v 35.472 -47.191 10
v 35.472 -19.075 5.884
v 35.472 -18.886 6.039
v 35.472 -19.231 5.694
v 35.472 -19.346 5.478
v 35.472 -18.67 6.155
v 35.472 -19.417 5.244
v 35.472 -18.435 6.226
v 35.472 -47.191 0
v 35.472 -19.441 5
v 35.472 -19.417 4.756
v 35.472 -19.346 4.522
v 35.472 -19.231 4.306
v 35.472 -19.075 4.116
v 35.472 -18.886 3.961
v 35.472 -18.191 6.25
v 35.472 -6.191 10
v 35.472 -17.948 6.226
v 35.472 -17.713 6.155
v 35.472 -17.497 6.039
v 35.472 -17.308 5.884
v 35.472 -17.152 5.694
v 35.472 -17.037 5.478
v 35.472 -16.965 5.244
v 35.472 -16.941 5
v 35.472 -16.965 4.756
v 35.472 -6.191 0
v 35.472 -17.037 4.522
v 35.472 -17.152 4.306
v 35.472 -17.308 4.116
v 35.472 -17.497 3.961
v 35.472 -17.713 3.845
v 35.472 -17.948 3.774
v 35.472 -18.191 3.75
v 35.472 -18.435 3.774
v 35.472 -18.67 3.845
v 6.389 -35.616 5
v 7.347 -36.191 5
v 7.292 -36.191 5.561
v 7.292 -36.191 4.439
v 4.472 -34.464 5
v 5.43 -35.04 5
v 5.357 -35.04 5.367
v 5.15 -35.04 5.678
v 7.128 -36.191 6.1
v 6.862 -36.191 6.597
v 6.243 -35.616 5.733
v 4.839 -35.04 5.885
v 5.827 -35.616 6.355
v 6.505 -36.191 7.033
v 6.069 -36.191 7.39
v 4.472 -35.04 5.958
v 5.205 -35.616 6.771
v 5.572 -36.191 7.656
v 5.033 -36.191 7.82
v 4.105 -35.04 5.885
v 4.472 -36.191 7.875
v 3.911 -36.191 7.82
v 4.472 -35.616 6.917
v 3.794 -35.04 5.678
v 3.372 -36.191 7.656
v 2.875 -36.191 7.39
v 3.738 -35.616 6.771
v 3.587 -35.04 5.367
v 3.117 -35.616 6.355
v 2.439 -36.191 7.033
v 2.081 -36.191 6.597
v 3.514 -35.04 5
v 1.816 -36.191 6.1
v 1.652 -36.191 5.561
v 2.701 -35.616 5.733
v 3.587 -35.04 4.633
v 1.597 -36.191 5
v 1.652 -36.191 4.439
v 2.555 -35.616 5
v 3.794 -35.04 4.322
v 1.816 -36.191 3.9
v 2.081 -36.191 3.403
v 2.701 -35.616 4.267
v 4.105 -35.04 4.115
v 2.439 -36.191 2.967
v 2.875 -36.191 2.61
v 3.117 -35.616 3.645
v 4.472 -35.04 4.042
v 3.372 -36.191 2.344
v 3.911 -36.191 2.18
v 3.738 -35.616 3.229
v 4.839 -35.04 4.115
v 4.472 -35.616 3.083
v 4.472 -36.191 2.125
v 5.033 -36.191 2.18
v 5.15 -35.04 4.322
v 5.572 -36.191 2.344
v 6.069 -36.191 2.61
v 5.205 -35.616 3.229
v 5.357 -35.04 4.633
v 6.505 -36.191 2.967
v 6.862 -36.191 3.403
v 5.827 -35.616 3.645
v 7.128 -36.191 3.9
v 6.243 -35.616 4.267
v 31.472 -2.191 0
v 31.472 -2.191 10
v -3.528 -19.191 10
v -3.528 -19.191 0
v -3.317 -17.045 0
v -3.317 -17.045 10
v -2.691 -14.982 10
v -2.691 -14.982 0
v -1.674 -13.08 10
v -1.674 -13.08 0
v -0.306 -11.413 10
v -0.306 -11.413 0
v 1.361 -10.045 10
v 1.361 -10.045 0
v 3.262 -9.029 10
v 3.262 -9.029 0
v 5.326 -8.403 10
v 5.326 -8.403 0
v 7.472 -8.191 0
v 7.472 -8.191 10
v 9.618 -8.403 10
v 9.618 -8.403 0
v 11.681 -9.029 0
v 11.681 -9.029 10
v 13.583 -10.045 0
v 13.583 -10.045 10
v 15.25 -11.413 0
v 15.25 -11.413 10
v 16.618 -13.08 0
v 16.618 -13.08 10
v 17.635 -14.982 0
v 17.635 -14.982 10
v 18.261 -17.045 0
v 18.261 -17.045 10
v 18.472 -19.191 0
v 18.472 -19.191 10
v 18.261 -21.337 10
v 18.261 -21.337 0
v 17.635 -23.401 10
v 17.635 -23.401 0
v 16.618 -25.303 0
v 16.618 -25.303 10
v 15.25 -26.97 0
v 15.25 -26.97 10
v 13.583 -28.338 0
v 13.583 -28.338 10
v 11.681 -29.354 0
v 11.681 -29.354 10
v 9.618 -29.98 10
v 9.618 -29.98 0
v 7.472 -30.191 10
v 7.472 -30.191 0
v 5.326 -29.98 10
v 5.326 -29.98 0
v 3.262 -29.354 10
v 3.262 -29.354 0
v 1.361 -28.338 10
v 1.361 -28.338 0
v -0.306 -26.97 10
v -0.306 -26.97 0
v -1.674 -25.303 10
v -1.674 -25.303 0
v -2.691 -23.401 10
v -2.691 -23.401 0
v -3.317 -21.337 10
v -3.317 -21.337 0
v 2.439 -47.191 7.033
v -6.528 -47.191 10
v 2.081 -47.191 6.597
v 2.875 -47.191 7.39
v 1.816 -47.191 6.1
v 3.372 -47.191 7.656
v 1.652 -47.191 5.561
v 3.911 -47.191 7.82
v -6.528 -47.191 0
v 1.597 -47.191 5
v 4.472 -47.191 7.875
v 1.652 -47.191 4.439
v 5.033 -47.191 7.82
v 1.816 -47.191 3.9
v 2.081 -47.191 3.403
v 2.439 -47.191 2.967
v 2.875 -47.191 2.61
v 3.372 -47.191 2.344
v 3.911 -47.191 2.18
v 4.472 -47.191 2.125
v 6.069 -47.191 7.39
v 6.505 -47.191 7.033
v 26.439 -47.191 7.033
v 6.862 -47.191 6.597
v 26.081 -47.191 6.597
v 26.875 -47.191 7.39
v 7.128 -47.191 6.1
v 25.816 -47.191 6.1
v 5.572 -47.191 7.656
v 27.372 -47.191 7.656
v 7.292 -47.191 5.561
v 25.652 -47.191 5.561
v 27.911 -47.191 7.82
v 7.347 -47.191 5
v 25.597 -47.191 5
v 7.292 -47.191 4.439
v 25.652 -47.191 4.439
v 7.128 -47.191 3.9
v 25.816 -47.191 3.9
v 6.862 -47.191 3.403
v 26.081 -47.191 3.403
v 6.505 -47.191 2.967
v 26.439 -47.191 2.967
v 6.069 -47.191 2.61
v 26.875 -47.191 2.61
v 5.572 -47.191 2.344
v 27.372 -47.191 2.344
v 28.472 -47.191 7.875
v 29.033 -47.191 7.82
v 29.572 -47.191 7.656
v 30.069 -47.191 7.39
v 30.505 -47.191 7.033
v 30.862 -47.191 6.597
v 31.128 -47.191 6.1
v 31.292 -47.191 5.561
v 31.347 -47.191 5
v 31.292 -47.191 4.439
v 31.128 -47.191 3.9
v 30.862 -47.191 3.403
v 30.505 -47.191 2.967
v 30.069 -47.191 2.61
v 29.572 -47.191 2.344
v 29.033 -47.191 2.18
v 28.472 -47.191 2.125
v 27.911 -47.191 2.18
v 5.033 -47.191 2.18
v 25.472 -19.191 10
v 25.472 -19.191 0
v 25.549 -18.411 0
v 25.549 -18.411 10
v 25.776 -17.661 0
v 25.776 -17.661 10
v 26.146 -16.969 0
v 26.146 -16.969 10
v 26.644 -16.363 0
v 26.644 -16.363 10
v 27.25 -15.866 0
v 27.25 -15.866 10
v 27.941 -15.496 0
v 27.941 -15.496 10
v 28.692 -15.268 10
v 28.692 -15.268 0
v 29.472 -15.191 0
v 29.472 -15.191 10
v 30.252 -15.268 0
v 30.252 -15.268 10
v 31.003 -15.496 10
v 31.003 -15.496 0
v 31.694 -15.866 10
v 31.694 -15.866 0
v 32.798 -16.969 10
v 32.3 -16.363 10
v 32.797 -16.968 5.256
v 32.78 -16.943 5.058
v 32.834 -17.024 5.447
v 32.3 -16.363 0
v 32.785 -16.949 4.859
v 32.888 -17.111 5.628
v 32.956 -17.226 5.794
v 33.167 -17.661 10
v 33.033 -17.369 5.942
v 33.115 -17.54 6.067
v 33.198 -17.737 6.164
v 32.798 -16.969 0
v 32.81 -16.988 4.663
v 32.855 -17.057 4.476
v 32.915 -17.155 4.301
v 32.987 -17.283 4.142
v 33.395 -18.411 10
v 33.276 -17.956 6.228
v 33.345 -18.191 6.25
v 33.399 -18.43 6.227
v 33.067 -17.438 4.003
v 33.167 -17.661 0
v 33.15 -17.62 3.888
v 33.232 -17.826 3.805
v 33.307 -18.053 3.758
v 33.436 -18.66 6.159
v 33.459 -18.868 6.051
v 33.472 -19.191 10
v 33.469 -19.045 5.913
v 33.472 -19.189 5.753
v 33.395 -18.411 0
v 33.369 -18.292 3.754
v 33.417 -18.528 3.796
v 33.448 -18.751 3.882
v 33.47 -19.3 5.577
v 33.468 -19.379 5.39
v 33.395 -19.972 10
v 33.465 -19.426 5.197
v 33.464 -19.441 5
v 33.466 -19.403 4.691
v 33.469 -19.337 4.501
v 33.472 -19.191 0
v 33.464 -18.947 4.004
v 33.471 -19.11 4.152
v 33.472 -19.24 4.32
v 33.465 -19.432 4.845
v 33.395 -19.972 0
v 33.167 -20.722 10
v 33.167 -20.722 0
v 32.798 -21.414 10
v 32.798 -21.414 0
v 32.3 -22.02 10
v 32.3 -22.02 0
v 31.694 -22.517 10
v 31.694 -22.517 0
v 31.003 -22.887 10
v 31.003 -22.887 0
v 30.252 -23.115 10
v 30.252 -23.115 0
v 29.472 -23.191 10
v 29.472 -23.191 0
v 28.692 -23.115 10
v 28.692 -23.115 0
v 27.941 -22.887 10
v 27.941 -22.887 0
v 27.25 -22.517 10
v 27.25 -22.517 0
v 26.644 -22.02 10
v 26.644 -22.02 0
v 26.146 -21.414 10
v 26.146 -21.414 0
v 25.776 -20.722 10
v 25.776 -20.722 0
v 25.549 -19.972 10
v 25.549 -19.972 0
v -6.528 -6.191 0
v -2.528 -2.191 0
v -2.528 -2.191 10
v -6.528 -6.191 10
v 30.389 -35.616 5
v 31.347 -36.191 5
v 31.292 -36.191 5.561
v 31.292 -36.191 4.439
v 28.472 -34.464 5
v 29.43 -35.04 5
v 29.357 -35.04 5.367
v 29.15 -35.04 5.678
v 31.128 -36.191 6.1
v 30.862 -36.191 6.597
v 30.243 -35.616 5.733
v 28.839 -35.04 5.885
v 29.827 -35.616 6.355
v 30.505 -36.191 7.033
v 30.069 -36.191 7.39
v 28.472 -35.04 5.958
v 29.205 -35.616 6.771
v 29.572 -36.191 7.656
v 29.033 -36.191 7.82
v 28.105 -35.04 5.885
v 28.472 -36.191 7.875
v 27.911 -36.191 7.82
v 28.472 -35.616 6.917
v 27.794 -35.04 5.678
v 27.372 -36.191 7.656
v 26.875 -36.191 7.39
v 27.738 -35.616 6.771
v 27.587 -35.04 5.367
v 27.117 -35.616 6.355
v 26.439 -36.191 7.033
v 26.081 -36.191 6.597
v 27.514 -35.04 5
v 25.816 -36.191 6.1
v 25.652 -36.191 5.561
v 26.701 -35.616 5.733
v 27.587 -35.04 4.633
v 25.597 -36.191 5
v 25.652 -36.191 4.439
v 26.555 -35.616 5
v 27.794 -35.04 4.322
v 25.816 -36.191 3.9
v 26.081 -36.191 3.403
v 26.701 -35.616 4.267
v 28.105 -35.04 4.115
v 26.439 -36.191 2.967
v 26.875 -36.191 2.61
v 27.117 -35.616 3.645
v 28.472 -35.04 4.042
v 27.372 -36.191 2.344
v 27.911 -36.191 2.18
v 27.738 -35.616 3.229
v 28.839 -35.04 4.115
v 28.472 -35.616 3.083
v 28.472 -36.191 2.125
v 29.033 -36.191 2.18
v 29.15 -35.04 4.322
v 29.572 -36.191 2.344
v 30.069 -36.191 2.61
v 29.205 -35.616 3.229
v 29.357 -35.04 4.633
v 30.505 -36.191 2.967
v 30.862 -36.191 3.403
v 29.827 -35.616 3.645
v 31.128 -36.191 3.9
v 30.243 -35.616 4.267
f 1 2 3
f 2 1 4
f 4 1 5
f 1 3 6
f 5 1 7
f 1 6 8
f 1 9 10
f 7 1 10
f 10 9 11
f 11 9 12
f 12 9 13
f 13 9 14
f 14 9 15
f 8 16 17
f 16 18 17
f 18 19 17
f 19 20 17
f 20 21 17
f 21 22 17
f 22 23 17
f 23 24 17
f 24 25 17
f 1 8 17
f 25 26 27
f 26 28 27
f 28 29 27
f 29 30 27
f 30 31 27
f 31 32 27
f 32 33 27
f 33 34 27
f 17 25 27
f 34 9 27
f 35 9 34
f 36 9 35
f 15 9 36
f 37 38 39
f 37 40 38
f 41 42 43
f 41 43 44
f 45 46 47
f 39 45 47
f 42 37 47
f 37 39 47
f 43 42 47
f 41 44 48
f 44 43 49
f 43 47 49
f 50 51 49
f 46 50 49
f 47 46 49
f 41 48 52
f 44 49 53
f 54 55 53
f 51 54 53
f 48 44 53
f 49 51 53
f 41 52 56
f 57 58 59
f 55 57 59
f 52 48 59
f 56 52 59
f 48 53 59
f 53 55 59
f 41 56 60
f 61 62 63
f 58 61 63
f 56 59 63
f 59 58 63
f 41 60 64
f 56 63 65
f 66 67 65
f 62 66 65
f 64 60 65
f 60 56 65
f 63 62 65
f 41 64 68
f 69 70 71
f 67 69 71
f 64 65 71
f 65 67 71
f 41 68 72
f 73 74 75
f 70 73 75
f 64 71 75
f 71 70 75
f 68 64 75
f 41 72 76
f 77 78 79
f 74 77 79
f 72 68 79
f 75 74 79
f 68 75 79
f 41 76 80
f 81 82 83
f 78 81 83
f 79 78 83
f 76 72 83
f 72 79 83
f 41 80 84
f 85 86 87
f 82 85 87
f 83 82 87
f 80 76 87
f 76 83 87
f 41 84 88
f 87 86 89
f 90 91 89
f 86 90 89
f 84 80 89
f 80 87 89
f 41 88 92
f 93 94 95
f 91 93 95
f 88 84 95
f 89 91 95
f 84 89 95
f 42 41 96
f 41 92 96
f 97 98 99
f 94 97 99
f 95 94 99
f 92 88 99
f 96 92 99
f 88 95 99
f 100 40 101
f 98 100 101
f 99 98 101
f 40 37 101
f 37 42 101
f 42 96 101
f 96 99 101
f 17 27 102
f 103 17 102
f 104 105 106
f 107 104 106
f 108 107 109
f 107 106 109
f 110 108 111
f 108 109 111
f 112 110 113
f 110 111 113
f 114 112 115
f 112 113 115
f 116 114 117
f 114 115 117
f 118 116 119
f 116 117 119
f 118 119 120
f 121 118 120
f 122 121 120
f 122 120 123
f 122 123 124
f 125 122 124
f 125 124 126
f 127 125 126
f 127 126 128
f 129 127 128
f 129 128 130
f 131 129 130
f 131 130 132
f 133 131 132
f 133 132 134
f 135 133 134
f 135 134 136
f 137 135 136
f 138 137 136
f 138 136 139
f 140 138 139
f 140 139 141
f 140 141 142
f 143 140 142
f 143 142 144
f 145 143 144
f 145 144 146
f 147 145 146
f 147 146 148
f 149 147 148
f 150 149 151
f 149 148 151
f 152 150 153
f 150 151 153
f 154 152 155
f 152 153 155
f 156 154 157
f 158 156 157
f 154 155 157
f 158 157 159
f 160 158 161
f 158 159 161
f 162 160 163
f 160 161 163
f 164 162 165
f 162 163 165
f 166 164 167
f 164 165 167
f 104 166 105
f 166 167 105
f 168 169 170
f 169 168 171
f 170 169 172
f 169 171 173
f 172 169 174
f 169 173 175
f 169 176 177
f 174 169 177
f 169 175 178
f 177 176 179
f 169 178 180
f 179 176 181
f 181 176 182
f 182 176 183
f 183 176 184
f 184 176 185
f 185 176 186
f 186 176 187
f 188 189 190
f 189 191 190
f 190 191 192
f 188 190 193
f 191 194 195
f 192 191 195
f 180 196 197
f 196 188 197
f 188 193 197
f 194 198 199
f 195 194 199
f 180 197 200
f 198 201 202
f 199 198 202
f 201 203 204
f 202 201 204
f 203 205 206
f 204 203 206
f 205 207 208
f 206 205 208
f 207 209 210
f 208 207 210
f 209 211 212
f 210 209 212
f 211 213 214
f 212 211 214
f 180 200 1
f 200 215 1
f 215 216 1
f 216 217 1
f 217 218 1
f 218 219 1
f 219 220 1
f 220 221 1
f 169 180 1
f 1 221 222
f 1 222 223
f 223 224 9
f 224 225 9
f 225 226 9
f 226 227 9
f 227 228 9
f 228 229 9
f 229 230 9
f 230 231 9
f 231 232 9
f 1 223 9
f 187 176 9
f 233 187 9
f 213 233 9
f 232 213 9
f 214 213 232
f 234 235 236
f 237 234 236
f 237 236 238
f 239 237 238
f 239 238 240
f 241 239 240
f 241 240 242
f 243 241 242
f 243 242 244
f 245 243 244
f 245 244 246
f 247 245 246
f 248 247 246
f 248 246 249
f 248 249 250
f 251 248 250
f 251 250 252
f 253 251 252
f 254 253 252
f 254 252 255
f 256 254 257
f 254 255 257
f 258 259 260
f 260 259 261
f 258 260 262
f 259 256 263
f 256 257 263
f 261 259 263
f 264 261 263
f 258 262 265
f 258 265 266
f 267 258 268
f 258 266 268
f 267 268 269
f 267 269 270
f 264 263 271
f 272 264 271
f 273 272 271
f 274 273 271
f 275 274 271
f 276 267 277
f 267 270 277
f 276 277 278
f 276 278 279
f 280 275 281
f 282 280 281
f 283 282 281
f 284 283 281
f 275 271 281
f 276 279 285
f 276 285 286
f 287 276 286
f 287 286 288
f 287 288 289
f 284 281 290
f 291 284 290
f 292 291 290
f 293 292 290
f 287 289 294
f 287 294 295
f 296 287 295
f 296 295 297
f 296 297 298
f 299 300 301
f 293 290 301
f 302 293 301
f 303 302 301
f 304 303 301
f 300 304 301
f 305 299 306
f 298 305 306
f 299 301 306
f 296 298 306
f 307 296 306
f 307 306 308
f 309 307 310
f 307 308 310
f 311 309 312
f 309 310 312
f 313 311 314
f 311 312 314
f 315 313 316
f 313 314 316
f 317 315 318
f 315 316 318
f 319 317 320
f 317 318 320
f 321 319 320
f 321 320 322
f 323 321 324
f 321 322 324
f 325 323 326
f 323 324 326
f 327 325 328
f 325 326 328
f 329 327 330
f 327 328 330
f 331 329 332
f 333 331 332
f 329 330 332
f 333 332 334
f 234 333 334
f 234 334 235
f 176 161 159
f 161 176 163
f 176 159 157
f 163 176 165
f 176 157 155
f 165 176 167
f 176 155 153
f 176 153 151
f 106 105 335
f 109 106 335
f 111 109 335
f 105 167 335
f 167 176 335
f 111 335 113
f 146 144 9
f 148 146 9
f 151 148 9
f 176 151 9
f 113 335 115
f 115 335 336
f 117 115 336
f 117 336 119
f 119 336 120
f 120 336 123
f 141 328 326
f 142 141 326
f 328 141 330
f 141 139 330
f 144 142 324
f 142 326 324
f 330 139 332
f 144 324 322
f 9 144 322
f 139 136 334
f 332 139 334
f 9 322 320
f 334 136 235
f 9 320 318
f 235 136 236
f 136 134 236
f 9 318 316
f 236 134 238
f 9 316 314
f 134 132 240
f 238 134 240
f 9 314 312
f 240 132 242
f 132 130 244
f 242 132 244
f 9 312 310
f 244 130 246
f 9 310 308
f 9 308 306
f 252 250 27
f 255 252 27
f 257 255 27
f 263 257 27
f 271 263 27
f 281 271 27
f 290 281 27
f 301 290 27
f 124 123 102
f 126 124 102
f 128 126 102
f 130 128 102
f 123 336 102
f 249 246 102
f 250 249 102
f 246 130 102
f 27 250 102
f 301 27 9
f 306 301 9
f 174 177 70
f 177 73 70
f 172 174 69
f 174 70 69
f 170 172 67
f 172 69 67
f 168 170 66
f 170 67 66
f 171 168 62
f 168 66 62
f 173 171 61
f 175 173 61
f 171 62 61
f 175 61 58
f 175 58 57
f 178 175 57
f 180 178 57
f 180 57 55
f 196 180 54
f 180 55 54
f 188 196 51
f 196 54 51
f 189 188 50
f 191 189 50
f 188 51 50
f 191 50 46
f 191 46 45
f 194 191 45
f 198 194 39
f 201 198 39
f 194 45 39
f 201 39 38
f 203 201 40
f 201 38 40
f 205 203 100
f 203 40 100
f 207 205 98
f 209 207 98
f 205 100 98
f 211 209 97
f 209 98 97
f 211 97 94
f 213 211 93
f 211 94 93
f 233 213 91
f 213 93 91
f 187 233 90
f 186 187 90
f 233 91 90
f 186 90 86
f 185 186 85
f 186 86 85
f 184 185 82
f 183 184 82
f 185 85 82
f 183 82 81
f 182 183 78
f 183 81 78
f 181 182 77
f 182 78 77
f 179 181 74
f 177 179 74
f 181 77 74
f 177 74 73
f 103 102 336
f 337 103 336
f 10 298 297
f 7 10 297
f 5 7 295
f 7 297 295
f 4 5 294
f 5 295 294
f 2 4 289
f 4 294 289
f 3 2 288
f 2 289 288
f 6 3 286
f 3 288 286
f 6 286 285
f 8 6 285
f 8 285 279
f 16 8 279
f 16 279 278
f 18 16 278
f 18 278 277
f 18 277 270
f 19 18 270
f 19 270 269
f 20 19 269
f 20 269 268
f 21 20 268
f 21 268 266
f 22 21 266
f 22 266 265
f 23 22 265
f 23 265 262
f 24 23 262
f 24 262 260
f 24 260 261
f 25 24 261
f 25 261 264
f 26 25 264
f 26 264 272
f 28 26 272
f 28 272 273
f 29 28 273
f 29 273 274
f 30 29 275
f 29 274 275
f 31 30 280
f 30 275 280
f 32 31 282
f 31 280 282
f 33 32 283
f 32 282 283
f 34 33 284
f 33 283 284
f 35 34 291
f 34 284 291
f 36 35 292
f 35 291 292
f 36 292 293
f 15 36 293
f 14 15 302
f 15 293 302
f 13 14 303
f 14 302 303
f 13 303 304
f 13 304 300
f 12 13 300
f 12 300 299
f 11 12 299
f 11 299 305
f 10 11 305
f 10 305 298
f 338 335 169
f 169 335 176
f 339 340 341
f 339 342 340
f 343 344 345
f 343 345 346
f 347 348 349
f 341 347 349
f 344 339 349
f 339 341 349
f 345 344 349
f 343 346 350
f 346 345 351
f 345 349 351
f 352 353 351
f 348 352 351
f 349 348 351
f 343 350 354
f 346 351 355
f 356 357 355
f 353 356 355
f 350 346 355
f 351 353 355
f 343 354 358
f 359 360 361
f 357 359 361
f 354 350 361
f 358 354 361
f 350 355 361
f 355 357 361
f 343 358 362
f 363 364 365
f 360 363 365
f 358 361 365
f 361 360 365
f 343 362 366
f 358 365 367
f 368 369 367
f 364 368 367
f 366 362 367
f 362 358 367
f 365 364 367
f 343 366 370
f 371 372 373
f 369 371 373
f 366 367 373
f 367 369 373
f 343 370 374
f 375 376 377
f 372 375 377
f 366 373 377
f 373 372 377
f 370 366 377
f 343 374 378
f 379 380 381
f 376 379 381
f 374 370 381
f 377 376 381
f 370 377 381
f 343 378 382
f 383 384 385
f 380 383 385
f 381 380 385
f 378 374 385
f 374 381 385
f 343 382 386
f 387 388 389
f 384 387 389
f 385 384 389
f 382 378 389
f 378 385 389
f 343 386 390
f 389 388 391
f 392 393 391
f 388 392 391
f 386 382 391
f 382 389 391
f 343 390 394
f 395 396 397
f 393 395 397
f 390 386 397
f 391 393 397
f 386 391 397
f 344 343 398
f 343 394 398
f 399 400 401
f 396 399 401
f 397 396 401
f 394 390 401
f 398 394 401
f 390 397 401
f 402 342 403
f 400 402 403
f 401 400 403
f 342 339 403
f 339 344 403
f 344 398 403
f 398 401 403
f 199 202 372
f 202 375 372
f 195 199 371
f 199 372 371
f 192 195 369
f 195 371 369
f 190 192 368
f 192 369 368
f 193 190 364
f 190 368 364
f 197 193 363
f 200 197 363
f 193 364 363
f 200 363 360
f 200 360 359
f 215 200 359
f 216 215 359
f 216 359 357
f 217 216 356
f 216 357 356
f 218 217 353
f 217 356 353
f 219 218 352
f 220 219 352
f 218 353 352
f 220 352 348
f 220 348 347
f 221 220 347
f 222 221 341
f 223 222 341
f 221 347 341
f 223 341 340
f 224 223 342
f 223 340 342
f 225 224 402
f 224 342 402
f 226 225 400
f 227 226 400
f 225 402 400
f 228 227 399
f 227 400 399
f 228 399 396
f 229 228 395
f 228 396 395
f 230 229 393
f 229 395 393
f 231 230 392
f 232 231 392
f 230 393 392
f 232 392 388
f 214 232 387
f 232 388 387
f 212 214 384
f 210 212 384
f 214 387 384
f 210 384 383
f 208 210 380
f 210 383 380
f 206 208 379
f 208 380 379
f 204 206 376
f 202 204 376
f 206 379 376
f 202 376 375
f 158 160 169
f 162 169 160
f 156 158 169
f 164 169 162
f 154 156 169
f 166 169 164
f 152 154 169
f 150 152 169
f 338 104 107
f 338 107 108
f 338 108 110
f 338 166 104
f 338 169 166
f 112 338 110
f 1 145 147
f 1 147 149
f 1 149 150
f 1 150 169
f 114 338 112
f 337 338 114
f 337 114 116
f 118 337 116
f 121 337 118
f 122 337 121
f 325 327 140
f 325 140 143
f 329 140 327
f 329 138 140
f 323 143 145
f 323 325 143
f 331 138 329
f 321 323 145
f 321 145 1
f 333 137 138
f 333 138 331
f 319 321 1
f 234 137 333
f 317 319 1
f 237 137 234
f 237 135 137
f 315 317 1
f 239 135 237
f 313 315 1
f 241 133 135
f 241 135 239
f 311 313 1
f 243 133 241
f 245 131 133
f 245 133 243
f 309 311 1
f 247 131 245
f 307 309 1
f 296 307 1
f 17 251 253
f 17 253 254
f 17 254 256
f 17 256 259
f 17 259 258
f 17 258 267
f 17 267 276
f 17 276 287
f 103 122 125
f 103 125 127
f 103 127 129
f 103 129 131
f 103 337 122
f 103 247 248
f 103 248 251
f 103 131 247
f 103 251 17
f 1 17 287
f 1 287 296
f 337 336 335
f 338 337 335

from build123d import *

# Parameters (mm, degrees)
F1_DEPTH = 10
F3_D     = 22
F4_D     = 8
F6_D     = 2.5
F6_DEPTH = 5
F6_TIP   = 0.7510757738
F8_D     = 5.75
F8_DEPTH = 11
F8_TIP   = 1.7274742797


# Not quite as in the source:
# - a feature names something its author has since deleted; it is built from what else it names


with BuildPart() as f1:
    # F0 (on Top) → F1 (new body)
    with BuildSketch(Plane.XY):
        Polygon((-6.5280715935, -6.1914156973), (-6.5280715935, -47.1914156973), (35.4719284065, -47.1914156973), (35.4719284065, -6.1914156973), (31.4719284065, -2.1914156973), (-2.5280715935, -2.1914156973), align=None)
    extrude(amount=F1_DEPTH)

    # F3 (through all)
    with Locations(Plane.XY.offset(10)):
        with Locations((7.4719284065, -19.1914156973)):
            Hole(F3_D / 2)

    # F4 (through all)
    with Locations(Plane.XY.offset(10)):
        with Locations((29.4719284065, -19.1914156973)):
            Hole(F4_D / 2)

    # F6
    with Locations(Plane.YZ.offset(35.4719284065)):
        with Locations((-18.1914156973, 5)):
            Hole(F6_D / 2, depth=F6_DEPTH)
            with Locations((0, 0, -(F6_DEPTH + F6_TIP / 2))):  # 118° drill point
                Cone(0, F6_D / 2, F6_TIP, mode=Mode.SUBTRACT)

    # F8
    with Locations(Plane.XZ.offset(47.1914156973)):
        with Locations((28.4719284065, 5), (4.4719284065, 5)):
            Hole(F8_D / 2, depth=F8_DEPTH)
            with Locations((0, 0, -(F8_DEPTH + F8_TIP / 2))):  # 118° drill point
                Cone(0, F8_D / 2, F8_TIP, mode=Mode.SUBTRACT)


solid = f1.part
